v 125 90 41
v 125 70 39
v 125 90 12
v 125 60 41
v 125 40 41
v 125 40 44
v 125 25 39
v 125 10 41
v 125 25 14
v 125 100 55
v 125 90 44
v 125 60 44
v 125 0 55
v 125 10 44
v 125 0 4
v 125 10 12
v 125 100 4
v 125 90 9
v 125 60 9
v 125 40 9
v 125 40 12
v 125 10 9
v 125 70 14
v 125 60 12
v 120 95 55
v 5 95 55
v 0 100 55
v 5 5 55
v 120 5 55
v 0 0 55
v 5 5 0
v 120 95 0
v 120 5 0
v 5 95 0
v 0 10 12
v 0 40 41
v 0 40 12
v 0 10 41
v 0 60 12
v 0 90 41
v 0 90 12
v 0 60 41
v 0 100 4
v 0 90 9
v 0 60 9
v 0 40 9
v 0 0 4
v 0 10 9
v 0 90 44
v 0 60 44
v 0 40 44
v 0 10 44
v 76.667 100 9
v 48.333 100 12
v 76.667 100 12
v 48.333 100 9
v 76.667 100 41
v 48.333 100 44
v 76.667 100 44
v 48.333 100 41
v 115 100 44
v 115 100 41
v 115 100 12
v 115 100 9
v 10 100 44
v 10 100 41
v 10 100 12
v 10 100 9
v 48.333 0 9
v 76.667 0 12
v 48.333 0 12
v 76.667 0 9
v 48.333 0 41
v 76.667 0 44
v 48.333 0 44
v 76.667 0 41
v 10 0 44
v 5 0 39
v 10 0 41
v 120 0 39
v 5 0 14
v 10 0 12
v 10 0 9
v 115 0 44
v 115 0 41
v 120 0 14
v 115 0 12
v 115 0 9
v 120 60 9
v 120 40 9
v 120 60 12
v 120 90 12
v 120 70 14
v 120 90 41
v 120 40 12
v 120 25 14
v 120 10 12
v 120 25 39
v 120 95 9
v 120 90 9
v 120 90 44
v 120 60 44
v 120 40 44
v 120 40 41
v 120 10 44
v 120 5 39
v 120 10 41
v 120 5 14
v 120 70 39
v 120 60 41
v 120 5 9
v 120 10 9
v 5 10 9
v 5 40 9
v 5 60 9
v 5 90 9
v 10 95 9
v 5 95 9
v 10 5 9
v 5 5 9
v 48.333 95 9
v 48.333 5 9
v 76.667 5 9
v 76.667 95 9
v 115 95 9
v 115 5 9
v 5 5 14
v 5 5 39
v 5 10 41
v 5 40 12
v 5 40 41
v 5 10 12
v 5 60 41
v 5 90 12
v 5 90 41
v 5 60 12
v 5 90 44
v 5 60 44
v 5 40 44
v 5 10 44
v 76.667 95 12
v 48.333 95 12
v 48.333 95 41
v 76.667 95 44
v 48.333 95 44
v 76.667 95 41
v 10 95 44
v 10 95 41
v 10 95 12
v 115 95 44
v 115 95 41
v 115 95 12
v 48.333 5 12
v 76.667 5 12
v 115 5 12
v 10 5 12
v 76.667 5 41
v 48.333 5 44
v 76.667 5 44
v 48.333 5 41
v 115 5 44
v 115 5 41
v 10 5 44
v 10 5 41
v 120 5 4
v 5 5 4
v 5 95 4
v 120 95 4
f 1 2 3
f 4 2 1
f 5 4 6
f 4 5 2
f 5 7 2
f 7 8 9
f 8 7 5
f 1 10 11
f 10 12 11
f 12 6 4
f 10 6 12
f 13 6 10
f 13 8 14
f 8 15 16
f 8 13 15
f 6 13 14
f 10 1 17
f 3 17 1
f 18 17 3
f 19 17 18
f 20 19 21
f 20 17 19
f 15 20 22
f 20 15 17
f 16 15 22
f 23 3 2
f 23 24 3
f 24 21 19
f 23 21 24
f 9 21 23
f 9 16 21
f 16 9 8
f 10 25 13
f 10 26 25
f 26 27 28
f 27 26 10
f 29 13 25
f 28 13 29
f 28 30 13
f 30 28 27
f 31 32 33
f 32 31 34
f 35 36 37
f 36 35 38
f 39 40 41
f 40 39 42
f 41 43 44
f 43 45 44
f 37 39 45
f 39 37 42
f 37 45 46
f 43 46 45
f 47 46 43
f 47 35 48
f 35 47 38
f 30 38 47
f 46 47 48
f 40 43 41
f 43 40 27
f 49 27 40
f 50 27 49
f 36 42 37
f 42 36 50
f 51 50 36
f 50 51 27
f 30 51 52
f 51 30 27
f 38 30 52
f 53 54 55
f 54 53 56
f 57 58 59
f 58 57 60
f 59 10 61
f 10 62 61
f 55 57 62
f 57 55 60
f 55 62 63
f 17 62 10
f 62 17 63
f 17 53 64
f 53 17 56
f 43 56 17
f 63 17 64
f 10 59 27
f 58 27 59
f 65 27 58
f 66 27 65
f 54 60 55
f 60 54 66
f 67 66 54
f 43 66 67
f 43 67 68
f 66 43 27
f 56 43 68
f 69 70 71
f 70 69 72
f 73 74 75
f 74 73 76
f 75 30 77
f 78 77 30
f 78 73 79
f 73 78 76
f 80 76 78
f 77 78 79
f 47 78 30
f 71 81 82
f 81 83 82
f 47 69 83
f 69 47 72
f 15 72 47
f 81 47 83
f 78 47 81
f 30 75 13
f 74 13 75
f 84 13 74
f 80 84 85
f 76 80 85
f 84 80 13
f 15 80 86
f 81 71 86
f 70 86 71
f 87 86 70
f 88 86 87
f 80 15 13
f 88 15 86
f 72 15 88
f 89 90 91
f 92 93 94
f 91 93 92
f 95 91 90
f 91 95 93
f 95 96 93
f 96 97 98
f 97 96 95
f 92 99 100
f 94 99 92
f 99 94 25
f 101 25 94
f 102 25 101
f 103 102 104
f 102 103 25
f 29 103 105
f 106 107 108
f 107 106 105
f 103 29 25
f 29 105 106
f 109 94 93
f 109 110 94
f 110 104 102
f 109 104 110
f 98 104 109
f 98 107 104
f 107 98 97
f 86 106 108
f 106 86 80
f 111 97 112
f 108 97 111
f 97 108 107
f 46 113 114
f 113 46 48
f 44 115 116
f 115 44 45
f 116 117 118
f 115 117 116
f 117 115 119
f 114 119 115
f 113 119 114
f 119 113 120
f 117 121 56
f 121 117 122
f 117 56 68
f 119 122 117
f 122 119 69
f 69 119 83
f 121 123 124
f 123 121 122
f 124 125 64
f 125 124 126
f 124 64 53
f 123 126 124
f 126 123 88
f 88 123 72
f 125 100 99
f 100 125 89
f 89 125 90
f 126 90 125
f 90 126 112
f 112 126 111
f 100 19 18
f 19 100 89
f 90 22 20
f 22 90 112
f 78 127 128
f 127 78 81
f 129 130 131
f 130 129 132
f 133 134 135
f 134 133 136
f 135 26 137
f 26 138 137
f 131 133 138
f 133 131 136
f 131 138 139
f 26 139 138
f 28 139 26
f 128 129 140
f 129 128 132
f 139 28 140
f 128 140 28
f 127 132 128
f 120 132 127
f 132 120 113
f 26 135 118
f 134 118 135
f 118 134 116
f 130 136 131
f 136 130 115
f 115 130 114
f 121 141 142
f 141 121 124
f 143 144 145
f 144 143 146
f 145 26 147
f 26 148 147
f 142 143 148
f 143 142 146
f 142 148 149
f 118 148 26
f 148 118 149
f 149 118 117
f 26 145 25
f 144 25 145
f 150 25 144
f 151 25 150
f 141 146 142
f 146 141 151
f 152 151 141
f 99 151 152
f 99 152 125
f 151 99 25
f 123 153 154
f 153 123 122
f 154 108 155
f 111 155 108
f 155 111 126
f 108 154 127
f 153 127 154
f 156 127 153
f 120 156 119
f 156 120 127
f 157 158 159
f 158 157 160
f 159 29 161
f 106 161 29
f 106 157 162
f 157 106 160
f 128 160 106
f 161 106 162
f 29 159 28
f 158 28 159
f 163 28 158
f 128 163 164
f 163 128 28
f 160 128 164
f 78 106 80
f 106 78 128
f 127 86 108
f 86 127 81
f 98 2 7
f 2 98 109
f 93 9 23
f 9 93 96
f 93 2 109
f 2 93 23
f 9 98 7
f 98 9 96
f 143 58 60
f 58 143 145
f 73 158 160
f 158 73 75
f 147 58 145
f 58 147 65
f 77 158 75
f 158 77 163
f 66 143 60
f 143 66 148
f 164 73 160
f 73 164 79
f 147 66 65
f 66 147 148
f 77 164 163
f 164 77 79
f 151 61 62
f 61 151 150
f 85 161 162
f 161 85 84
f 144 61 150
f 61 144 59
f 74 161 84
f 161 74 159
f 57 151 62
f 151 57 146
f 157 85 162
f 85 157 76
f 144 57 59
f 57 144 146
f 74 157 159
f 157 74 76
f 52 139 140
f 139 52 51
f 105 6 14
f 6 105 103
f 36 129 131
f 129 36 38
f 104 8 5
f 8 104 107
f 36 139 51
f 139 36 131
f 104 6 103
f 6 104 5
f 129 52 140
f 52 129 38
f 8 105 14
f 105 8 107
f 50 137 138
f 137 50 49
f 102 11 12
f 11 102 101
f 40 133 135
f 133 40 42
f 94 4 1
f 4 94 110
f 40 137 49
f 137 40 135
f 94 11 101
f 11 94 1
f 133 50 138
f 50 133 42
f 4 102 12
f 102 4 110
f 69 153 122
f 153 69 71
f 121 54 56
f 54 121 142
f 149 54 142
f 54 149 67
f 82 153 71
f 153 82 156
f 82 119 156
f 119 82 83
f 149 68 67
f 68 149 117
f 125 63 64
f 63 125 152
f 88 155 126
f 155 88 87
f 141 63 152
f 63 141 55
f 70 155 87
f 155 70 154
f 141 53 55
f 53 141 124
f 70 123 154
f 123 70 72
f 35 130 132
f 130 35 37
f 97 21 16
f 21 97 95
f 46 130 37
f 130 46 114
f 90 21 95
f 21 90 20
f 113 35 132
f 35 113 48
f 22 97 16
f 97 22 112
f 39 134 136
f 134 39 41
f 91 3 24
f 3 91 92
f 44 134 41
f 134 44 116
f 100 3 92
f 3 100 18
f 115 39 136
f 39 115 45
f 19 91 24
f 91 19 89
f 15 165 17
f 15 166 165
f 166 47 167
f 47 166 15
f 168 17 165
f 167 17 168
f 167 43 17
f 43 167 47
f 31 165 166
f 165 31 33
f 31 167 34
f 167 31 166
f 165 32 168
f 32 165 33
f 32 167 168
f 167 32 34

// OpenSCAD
// file: hEX-hAP-Vars.scad
InnerW=115;
InnerD=90;
LipH=4;
Wall=5;
TabX=20;

DW=Wall*2;
OuterW=InnerW+DW;
OuterD=InnerD+DW;
Buff=1;
DB=Buff*2;
// main file
include <hEX-hAP-Vars.scad>;

InnerH=31;
Front=25;
DevFeet=5;
SideCutH=25;
SideCutD=45;
SideCutPosD=25;
SideCutPosH=5;
VentH=3;

BoxFloor=LipH+Wall;
OuterH=LipH+InnerH+DW+DW;
TopVentH=BoxFloor+InnerH+Buff;
BottomVentH=BoxFloor;


difference()
{
  cube([OuterW,OuterD,OuterH]);
  //Main inner Cut
  translate([Wall,Wall,BoxFloor]) cube([InnerW,InnerD,OuterH]); 
  //Front cut
  translate([Wall,-Buff,BoxFloor+DevFeet]) cube([InnerW,DW,Front]);
  //Side Cut
  translate([InnerW+Wall-Buff,SideCutPosD,BoxFloor+SideCutPosH]) cube([DW,SideCutD,SideCutH]); 
  
  // Top vents  
  translate([DW,-Buff,TopVentH]) cube([InnerW/3,OuterD+DW,VentH]);
  translate([((InnerW/3)*2),-Buff,TopVentH]) cube([InnerW/3,OuterD+DW,VentH]);
  translate([-Buff,DW,TopVentH]) cube([OuterW+DW,InnerD/3,VentH]);
  translate([-Buff,((InnerD/3)*2),TopVentH]) cube([OuterW+DW,InnerD/3,VentH]);
  
  // Bottom vents  
  translate([DW,-Buff,BottomVentH]) cube([InnerW/3,OuterD+DW,VentH]);
  translate([((InnerW/3)*2),-Buff,BottomVentH]) cube([InnerW/3,OuterD+DW,VentH]);
  translate([-Buff,DW,BottomVentH]) cube([OuterW+DW,InnerD/3,VentH]);
  translate([-Buff,((InnerD/3)*2),BottomVentH]) cube([OuterW+DW,InnerD/3,VentH]);
  
  //Stacking lip
  translate([-Buff,-Buff,-Buff]) cube([OuterW+DB+Buff,Wall+Buff,LipH+Buff]);
  translate([-Buff,-Buff,-Buff]) cube([Wall+Buff,OuterD+DB,LipH+Buff]);
  translate([OuterW-Wall,-Buff,-Buff]) cube([Wall+Buff,OuterD+Buff,LipH+Buff]);
  translate([-Buff,OuterD-Wall,-Buff]) cube([OuterW+DW+Buff,Wall+DB+Buff,LipH+Buff]);
}
